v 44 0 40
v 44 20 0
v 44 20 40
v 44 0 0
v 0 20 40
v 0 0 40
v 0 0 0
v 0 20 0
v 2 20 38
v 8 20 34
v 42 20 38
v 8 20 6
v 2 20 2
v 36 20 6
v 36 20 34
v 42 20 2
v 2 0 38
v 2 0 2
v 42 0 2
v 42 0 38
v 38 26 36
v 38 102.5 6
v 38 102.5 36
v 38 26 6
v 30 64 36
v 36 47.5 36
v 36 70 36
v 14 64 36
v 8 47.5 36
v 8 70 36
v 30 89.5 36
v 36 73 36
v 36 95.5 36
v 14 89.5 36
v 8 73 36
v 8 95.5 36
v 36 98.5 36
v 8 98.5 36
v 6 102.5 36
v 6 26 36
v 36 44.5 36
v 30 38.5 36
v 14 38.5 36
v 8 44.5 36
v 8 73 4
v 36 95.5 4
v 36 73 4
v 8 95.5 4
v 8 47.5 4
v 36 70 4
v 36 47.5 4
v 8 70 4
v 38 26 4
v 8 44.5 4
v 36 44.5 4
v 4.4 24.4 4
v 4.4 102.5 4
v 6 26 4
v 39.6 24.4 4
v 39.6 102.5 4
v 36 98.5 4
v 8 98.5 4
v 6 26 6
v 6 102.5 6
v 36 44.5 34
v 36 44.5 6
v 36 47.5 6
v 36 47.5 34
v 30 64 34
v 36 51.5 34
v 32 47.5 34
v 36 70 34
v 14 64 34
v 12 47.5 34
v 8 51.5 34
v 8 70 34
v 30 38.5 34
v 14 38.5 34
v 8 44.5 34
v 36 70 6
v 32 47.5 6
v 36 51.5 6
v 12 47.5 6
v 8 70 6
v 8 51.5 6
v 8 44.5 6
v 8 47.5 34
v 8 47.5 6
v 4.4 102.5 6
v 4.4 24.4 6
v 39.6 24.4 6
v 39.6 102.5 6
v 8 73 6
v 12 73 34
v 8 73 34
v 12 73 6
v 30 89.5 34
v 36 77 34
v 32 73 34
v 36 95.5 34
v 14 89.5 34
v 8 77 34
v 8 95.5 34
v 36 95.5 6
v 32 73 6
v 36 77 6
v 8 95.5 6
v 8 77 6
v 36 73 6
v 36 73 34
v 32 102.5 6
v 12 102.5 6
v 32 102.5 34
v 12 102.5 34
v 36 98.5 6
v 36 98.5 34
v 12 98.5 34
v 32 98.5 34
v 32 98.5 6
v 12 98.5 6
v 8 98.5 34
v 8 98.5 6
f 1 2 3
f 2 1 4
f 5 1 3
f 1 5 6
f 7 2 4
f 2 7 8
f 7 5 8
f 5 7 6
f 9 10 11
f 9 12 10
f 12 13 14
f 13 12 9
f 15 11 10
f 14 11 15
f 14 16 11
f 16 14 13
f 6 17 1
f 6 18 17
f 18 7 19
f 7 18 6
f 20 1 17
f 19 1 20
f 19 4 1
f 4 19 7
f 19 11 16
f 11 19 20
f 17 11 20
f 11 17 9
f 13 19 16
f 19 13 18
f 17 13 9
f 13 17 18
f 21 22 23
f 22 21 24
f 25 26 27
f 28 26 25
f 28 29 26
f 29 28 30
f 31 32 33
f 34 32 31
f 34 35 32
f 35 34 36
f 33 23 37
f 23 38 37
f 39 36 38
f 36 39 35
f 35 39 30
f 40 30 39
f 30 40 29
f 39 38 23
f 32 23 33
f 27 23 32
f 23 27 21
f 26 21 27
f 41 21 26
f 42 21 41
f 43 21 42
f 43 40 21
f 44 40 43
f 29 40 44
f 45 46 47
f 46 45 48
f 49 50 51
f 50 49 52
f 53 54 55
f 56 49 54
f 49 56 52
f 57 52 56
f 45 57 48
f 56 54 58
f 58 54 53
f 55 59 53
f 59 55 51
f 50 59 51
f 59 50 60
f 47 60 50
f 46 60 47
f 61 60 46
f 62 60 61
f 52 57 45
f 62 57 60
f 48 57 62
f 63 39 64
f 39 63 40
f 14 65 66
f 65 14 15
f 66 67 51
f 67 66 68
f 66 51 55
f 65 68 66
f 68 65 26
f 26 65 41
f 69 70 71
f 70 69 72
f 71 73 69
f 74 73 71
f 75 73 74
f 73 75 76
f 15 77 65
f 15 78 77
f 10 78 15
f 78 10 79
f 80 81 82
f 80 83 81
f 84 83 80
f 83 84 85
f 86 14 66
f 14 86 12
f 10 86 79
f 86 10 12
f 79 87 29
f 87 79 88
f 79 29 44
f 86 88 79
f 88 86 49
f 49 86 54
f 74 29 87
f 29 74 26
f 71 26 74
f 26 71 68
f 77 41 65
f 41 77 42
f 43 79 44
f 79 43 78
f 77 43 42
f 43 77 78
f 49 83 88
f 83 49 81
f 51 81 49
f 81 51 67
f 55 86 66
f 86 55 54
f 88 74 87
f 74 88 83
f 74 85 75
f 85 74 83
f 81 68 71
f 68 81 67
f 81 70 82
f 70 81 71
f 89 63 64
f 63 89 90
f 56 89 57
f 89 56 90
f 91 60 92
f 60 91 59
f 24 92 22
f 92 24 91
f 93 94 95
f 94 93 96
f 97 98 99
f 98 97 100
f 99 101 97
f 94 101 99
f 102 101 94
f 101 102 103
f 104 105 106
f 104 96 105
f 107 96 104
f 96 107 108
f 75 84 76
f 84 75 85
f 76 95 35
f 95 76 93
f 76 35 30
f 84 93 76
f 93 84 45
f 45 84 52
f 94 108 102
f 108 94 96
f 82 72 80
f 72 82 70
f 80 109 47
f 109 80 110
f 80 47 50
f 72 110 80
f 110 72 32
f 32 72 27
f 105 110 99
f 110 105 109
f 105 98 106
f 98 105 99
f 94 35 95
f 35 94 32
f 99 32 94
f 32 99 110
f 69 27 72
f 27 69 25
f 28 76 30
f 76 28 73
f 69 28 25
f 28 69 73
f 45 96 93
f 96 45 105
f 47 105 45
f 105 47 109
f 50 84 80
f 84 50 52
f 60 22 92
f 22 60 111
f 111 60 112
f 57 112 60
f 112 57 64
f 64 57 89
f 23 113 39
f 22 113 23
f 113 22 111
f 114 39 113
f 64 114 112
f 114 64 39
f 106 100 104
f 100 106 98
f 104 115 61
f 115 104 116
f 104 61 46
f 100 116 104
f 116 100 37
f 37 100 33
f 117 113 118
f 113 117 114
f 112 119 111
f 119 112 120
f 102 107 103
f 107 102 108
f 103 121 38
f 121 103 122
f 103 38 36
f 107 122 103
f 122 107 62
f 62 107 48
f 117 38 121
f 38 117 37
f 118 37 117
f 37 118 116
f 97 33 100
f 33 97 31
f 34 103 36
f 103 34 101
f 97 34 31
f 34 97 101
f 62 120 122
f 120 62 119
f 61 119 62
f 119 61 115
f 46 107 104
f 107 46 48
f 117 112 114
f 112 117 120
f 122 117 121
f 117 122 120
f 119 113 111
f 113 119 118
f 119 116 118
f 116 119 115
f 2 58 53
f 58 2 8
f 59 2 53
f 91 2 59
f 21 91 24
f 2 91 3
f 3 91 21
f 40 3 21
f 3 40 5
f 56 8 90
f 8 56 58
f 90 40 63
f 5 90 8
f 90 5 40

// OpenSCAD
 //Variables
// Select which part you want to create: corpus is the main part of the pollenstripper, corpus_brush is a version of the pollenstripper with angled mounts for brushes, the darkener is a part that sits on top of the plexiglas cube to keep light from getting in and the funnel was meant to collect the pollen after it fell off and through the grid (deprecated)
cube_design = "corpus"; // [corpus, corpus_brush, darkener, funnel]

/* [Acrylic Cube] */
plexi_cube_width = 39; //39 for cube1, 32 for cube2
plexi_cube_length = 35; //35 for cube1, 30 for cube2
plexi_cube_depth_overall = 30;
plexi_cube_depth = 20; //this is for the main corpus
plexi_cube_thickness = 2;
plexi_cube_buffer = 0.5; //1mm room in every direction

/* [Darkener] */
// The length that the darkener overlaps with the corpus
darkener_overhang = 10;

/* [Insert] */
//needs to be the same as in the insert creator
insert_bar_height = 6;
//needs to be the same as in the insert creator
insert_bar_length = 16;
//needs to be the same as "base plate length upper" in the insert creator
insert_base_length = 28;
//needs to be the same as "base plate thickness" in the insert creator
insert_thickness = 2;
// buffer space between corpus and insert
insert_buffer = 1;
// distance of the insert from the end of the tube. CAREFUL: changing this can break the design, default=4
insert_distance_from_tube_end = 4;

/* [Corpus Basics] */
//thickness of the tubes (lower parts of the corpus containing the inserts)
tube_thickness = 2;
//width of the tubes
tube_width = 28;
//length of the tubes
tube_length = 28;
//depth of the tubes, 25.5 for normal corpus design, 32 for brush
tube_depth = 25.5; // was 38.5, for normal design 25.5, increase for brush to 32
//number of tubes
tube_count = 3;

// width of the bar that locks the inserts so that they can't move to the back, CAREFUL: changing this will break the design, default = 4
security_bar_width = 4;
slide_bar_length = tube_depth+2;
// width of the bar the funnel slides on
slide_bar_width = 1.6; //decreased from 2 to 1,6 for buffer
//height of the bar the funnel slides on
slide_bar_height = 2;

/* [Grid Pattern] */
// grid pattern, meant to let the stripped pollen fall through into the funnel
grid_pattern = "None"; //[None, squares, squares2]
//width of the squares
square_width = 5;
//length of the squares
square_length = 4;
//distance between the squares
square_distance = 2;
//number oif squares per row
number_squares_per_row = 4;
//number of squares per column, suggestion for normal corpus 2, for brush 3
number_squares_per_column = 3;

/* [Brush] */
// length of the top part of the brush
brush_head_length = 16;
// length of the bottom part of the brush
brush_bottom_length = 24;
// width of the brush
brush_width = 19.25;
// thickness of the brush
brush_thickness = 5.5;
// distance of the screw holes from the top of the brush
distance_hole_from_top = 1.6;
// distance of the screw holes from the side of the brush
distance_hole_from_side = 2.6;
// diameter of the screw holes
diameter = 3;

/* [Funnel] */
// width of the bars that slide on the corpus
funnel_slide_width = 4;
// height of the bars that slide on the corpus
funnel_slide_height = 7;
// height of the hollow part of the bars that slide on the corpus
funnel_slide_hollow_height = 3;
// buffer between the corpus bar and the funnel slide bar
funnel_slide_buffer_width = 0.2;
// length of the pyramid
funnel_pyramid_length = 32;
// height of the tip of the pyramid part
funnel_pyramid_tip_height = 18;
// width of the cube at the top of the funnel
funnel_tip_cube_width = 14;
// length of the cube at the top of the funnel
funnel_tip_cube_length = 14;
// height of the cube at the top of the funnel
funnel_tip_cube_height = 11;
// height of the cylinder that hollows out the top of the funnel
funnel_hollow_cylinder_height = 20;
// diameter of the cylinder that hollows out the top of the funnel
funnel_hollow_cylinder_diameter = 7;



/* [Misc] */
// Number of Faces: higher number is good for smoother curved areas, lower number significantly decreases rendering time, recommending 25 for playing around and 100 for exporting
$fn = 50;

//angle
tube_distance_left = (plexi_cube_width/2+plexi_cube_buffer+plexi_cube_thickness-tube_width/2-tube_thickness);
tube_distance_bottom = (plexi_cube_length/2+plexi_cube_buffer+plexi_cube_thickness-tube_length/2-tube_thickness);
angle_depth = max(tube_distance_left, tube_distance_bottom);
outer_cube_width = plexi_cube_width + 2*plexi_cube_thickness + 2*plexi_cube_buffer;
outer_cube_length = plexi_cube_length + 2*plexi_cube_thickness + 2*plexi_cube_buffer;

//module to create triangles
module triangle(width,length,height){
    difference(){
        cube([width,length,height]);
        rotate([0,0,45]) cube([width*2.5,length*2.5,height*5]);
    }
}

//module to show points of a polyhedron
module showPoints(v) {
    for (i = [0: len(v)-1]) {
        translate(v[i]) color("red") 
        text(str(i), font = "Courier New", size=1.5);
         
    }
}

//module to create a square grid pattern
module square_grid(){
    grid_width = square_width*number_squares_per_row + square_distance*(number_squares_per_row-1);
    grid_length = square_length*number_squares_per_column + square_distance*(number_squares_per_column-1);
translate([tube_width/2+tube_thickness-grid_width/2,tube_depth+angle_depth-(insert_distance_from_tube_end+insert_thickness+insert_buffer+insert_bar_height)+3,0])
translate([grid_width,0,0])
rotate([0,0,180])
for (j=[0:number_squares_per_column-1]){
for (i=[0:number_squares_per_row-1]){
    translate([i*(square_distance+square_width),j*(square_distance+square_length),0])cube([square_width,square_length,tube_thickness]);
    }
}
}

module square_grid2(){
    grid_width = square_width*number_squares_per_row + square_distance*(number_squares_per_row-1);
    grid_length = square_length*number_squares_per_column + square_distance*(number_squares_per_column-1);
translate([tube_width/2+tube_thickness-grid_width/2,tube_depth+angle_depth-(insert_distance_from_tube_end+insert_thickness+insert_buffer+insert_bar_height),0])
translate([grid_width-square_length/2,0,0])
rotate([0,0,180])
for (j=[0:number_squares_per_column-1]){
for (i=[0:number_squares_per_row-1]){
    translate([i*(square_distance+square_width),j*(square_distance+square_length),0])rotate([0,0,45])cube([square_width,square_length,tube_thickness]);
    }
}
}

//module to create a brush as a standin
module brush (){
difference(){
union(){
color("green")cube([brush_width, brush_thickness, brush_head_length]);
color("brown")translate([0,0,brush_head_length])cube([brush_width, brush_thickness, brush_bottom_length]);
}

union(){
translate([diameter/2+distance_hole_from_side,0,diameter/2 + distance_hole_from_top])rotate([270,0,0])cylinder(h=brush_thickness, d=diameter);
translate([brush_width-diameter/2-distance_hole_from_side,0,diameter/2 + distance_hole_from_top])rotate([270,0,0])cylinder(h=brush_thickness, d=diameter);
}
}
}

//module to create a mount for the brush
module brush_mount (){
difference(){
union(){
color("green")cube([brush_width, brush_thickness, brush_head_length]);
color("brown")translate([0,0,brush_head_length])cube([brush_width, brush_thickness, brush_bottom_length]);
}

union(){
translate([diameter/2+distance_hole_from_side,0,diameter/2 + distance_hole_from_top])rotate([270,0,0])cylinder(h=brush_thickness, d=diameter);
translate([brush_width-diameter/2-distance_hole_from_side,0,diameter/2 + distance_hole_from_top])rotate([270,0,0])cylinder(h=brush_thickness, d=diameter);
}
}
}


if (cube_design == "corpus"){
union(){

//plexi_cube part of the tube
difference(){
    cube([plexi_cube_width + 2*plexi_cube_thickness + 2*plexi_cube_buffer, plexi_cube_depth, plexi_cube_length+2*plexi_cube_thickness + 2*plexi_cube_buffer]);
    translate([plexi_cube_thickness,0,plexi_cube_thickness])cube([plexi_cube_width + 2*plexi_cube_buffer, plexi_cube_depth, plexi_cube_length + 2*plexi_cube_buffer]);
}

//angle
angle_points = [
    [0,0,0], //0
    [outer_cube_width,0,0],//1
    [outer_cube_width,0,outer_cube_length],//2
    [0,0,outer_cube_length],//3
    [tube_distance_left,0,tube_distance_bottom],//4
    [outer_cube_width-tube_distance_left,0,tube_distance_bottom],//5
    [outer_cube_width-tube_distance_left,0,outer_cube_length-tube_distance_bottom],//6
    [tube_distance_left,0,outer_cube_length-tube_distance_bottom],//7
    [tube_distance_left,angle_depth,tube_distance_bottom],//8
    [outer_cube_width-tube_distance_left,angle_depth,tube_distance_bottom],//9
    [outer_cube_width-tube_distance_left,angle_depth,outer_cube_length-tube_distance_bottom],//10
    [tube_distance_left,angle_depth,outer_cube_length-tube_distance_bottom],//11
    
];

*showPoints(angle_points);
angle_faces = [
    [1,0,4,5],
    [0,1,9,8],
    [5,4,8,9],
    [2,1,5,6],
    [1,2,10,9],
    [6,5,9,10],
    [3,2,6,7],
    [2,3,11,10],
    [7,6,10,11],
    [0,3,7,4],
    [3,0,8,11],
    [4,7,11,8],
];


translate([0,plexi_cube_depth,0])
polyhedron(angle_points, angle_faces);



//tube
translate([plexi_cube_width/2-tube_width/2 + plexi_cube_buffer,plexi_cube_depth ,plexi_cube_length/2-tube_length/2 + plexi_cube_buffer]) 
for(i=[0:tube_count-1]){
if (i==0){
translate([0,tube_depth*i,0])    
union(){
difference(){
    cube([tube_width+2*tube_thickness, tube_depth + angle_depth, tube_length + 2*tube_thickness]);
    translate([tube_thickness,0,tube_thickness])cube([tube_width, tube_depth + angle_depth, tube_length]);
    

insert_slot_upper_points = [
    [0,0,0], //0
    [insert_base_length,0,0],//1
    [insert_base_length,insert_thickness + insert_buffer, 0],//2
    [insert_base_length/2 + insert_bar_length/2,insert_thickness + insert_buffer + insert_bar_height,0],//3
    [insert_base_length/2 - insert_bar_length/2,insert_thickness + insert_buffer + insert_bar_height,0],//4
    [0,insert_thickness + insert_buffer, 0],//5
    [0,0,tube_thickness], //6
    [insert_base_length,0,tube_thickness],//7
    [insert_base_length,insert_thickness + insert_buffer, tube_thickness],//8
    [insert_base_length/2 + insert_bar_length/2,insert_thickness + insert_buffer + insert_bar_height,tube_thickness],//9
    [insert_base_length/2 - insert_bar_length/2,insert_thickness + insert_buffer + insert_bar_height,tube_thickness],//10
    [0,insert_thickness + insert_buffer, tube_thickness],//11
];

*showPoints(insert_slot_upper_points);

insert_slot_upper_faces = [
    [0,1,2,3,4,5],
    [0,5,11,6],
    [5,4,10,11],
    [4,3,9,10],
    [3,2,8,9],
    [2,1,7,8],
    [1,0,6,7],
    [11,10,9,8,7,6]
];

translate([tube_width/2+tube_thickness-insert_base_length/2,tube_depth+angle_depth-(insert_bar_height+insert_thickness+insert_buffer)-insert_distance_from_tube_end,tube_length+tube_thickness])translate([insert_base_length,insert_bar_height + insert_thickness + insert_buffer,0])rotate([0,0,180])polyhedron(insert_slot_upper_points,insert_slot_upper_faces);

translate([tube_width/2+tube_thickness-insert_base_length/2,tube_depth+angle_depth-(insert_thickness+insert_buffer)-insert_distance_from_tube_end,0])cube([insert_base_length,insert_thickness+insert_buffer,tube_thickness]);


if (grid_pattern == "squares") square_grid();
else if (grid_pattern == "squares2") square_grid2();   
    
}

//security_bar
translate([tube_thickness,tube_depth+angle_depth-insert_distance_from_tube_end,tube_thickness])translate([0,insert_distance_from_tube_end,0])rotate([0,0,270])triangle(insert_distance_from_tube_end,security_bar_width,tube_length);
translate([tube_width-tube_thickness,tube_depth+angle_depth-insert_distance_from_tube_end,tube_thickness])triangle(insert_distance_from_tube_end,security_bar_width,tube_length);

//slide bar
translate([-slide_bar_width,tube_depth+angle_depth-slide_bar_length,0])
color("red"){cube([slide_bar_width,slide_bar_length,slide_bar_height]); 
}
translate([tube_width+2*tube_thickness,tube_depth+angle_depth-slide_bar_length,0])
color("red"){cube([slide_bar_width,slide_bar_length,slide_bar_height]); 
}

}
}
else if (i<tube_count-1){
translate([0,tube_depth*i,0])    
union(){
difference(){
    translate([0,angle_depth,0])
    cube([tube_width+2*tube_thickness, tube_depth , tube_length + 2*tube_thickness]);
    translate([tube_thickness,0,tube_thickness])cube([tube_width, tube_depth + angle_depth, tube_length]);
    

insert_slot_upper_points = [
    [0,0,0], //0
    [insert_base_length,0,0],//1
    [insert_base_length,insert_thickness + insert_buffer, 0],//2
    [insert_base_length/2 + insert_bar_length/2,insert_thickness + insert_buffer + insert_bar_height,0],//3
    [insert_base_length/2 - insert_bar_length/2,insert_thickness + insert_buffer + insert_bar_height,0],//4
    [0,insert_thickness + insert_buffer, 0],//5
    [0,0,tube_thickness], //6
    [insert_base_length,0,tube_thickness],//7
    [insert_base_length,insert_thickness + insert_buffer, tube_thickness],//8
    [insert_base_length/2 + insert_bar_length/2,insert_thickness + insert_buffer + insert_bar_height,tube_thickness],//9
    [insert_base_length/2 - insert_bar_length/2,insert_thickness + insert_buffer + insert_bar_height,tube_thickness],//10
    [0,insert_thickness + insert_buffer, tube_thickness],//11
];

*showPoints(insert_slot_upper_points);

insert_slot_upper_faces = [
    [0,1,2,3,4,5],
    [0,5,11,6],
    [5,4,10,11],
    [4,3,9,10],
    [3,2,8,9],
    [2,1,7,8],
    [1,0,6,7],
    [11,10,9,8,7,6]
];

translate([tube_width/2+tube_thickness-insert_base_length/2,tube_depth+angle_depth-(insert_bar_height+insert_thickness+insert_buffer)-insert_distance_from_tube_end,tube_length+tube_thickness])translate([insert_base_length,insert_bar_height + insert_thickness + insert_buffer,0])rotate([0,0,180])polyhedron(insert_slot_upper_points,insert_slot_upper_faces);

translate([tube_width/2+tube_thickness-insert_base_length/2,tube_depth+angle_depth-(insert_thickness+insert_buffer)-insert_distance_from_tube_end,0])cube([insert_base_length,insert_thickness+insert_buffer,tube_thickness]);


if (grid_pattern == "squares") square_grid();
else if (grid_pattern == "squares2") square_grid2();   
    
}

//security_bar
translate([tube_thickness,tube_depth+angle_depth-insert_distance_from_tube_end,tube_thickness])translate([0,insert_distance_from_tube_end,0])rotate([0,0,270])triangle(insert_distance_from_tube_end,security_bar_width,tube_length);
translate([tube_width-tube_thickness,tube_depth+angle_depth-insert_distance_from_tube_end,tube_thickness])triangle(insert_distance_from_tube_end,security_bar_width,tube_length);

//slide bar
translate([-slide_bar_width,tube_depth+angle_depth-slide_bar_length,0])
color("red"){cube([slide_bar_width,slide_bar_length,slide_bar_height]); 
}
translate([tube_width+2*tube_thickness,tube_depth+angle_depth-slide_bar_length,0])
color("red"){cube([slide_bar_width,slide_bar_length,slide_bar_height]); 
}

}
}
else if (i==tube_count-1){
translate([0,tube_depth*i,0])    
union(){
difference(){
    translate([0,angle_depth,0])
    cube([tube_width+2*tube_thickness, tube_depth , tube_length + 2*tube_thickness]);
    translate([tube_thickness,0,tube_thickness])cube([tube_width, tube_depth + angle_depth, tube_length]);
    
//insert_slot
insert_slot_upper_points = [
    [0,0,0], //0
    [insert_base_length,0,0],//1
    [insert_base_length,insert_thickness + insert_buffer, 0],//2
    [insert_base_length/2 + insert_bar_length/2,insert_thickness + insert_buffer + insert_bar_height,0],//3
    [insert_base_length/2 - insert_bar_length/2,insert_thickness + insert_buffer + insert_bar_height,0],//4
    [0,insert_thickness + insert_buffer, 0],//5
    [0,0,tube_thickness], //6
    [insert_base_length,0,tube_thickness],//7
    [insert_base_length,insert_thickness + insert_buffer, tube_thickness],//8
    [insert_base_length/2 + insert_bar_length/2,insert_thickness + insert_buffer + insert_bar_height,tube_thickness],//9
    [insert_base_length/2 - insert_bar_length/2,insert_thickness + insert_buffer + insert_bar_height,tube_thickness],//10
    [0,insert_thickness + insert_buffer, tube_thickness],//11
];

*showPoints(insert_slot_upper_points);

insert_slot_upper_faces = [
    [0,1,2,3,4,5],
    [0,5,11,6],
    [5,4,10,11],
    [4,3,9,10],
    [3,2,8,9],
    [2,1,7,8],
    [1,0,6,7],
    [11,10,9,8,7,6]
];

translate([tube_width/2+tube_thickness-insert_base_length/2,tube_depth+angle_depth-(insert_bar_height+insert_thickness+insert_buffer)-insert_distance_from_tube_end,tube_length+tube_thickness])translate([insert_base_length,insert_bar_height + insert_thickness + insert_buffer,0])rotate([0,0,180])polyhedron(insert_slot_upper_points,insert_slot_upper_faces);

translate([tube_width/2+tube_thickness-insert_base_length/2,tube_depth+angle_depth-(insert_thickness+insert_buffer)-insert_distance_from_tube_end,0])cube([insert_base_length,insert_thickness+insert_buffer,tube_thickness]);


if (grid_pattern == "squares") square_grid();
else if (grid_pattern == "squares2") square_grid2();   
    
}
//security_bar
translate([tube_thickness,tube_depth+angle_depth-insert_distance_from_tube_end,tube_thickness])cube([security_bar_width,insert_distance_from_tube_end,tube_length]);
translate([tube_width-tube_thickness,tube_depth+angle_depth-insert_distance_from_tube_end,tube_thickness])cube([security_bar_width,insert_distance_from_tube_end,tube_length]);
//slide_bar
translate([-slide_bar_width,tube_depth+angle_depth-slide_bar_length,0])
color("red"){cube([slide_bar_width,slide_bar_length,slide_bar_height]); 
}
translate([tube_width+2*tube_thickness,tube_depth+angle_depth-slide_bar_length,0])
color("red"){cube([slide_bar_width,slide_bar_length,slide_bar_height]); 

}
}
}
}
}
}
// -----------------------------------------
if (cube_design == "corpus_brush"){
union(){

//plexi_cube part of the tube
difference(){
    cube([plexi_cube_width + 2*plexi_cube_thickness + 2*plexi_cube_buffer, plexi_cube_depth, plexi_cube_length+2*plexi_cube_thickness + 2*plexi_cube_buffer]);
    translate([plexi_cube_thickness,0,plexi_cube_thickness])cube([plexi_cube_width + 2*plexi_cube_buffer, plexi_cube_depth, plexi_cube_length + 2*plexi_cube_buffer]);
}

//angle
angle_points = [
    [0,0,0], //0
    [outer_cube_width,0,0],//1
    [outer_cube_width,0,outer_cube_length],//2
    [0,0,outer_cube_length],//3
    [tube_distance_left,0,tube_distance_bottom],//4
    [outer_cube_width-tube_distance_left,0,tube_distance_bottom],//5
    [outer_cube_width-tube_distance_left,0,outer_cube_length-tube_distance_bottom],//6
    [tube_distance_left,0,outer_cube_length-tube_distance_bottom],//7
    [tube_distance_left,angle_depth,tube_distance_bottom],//8
    [outer_cube_width-tube_distance_left,angle_depth,tube_distance_bottom],//9
    [outer_cube_width-tube_distance_left,angle_depth,outer_cube_length-tube_distance_bottom],//10
    [tube_distance_left,angle_depth,outer_cube_length-tube_distance_bottom],//11
    
];

*showPoints(angle_points);
angle_faces = [
    [1,0,4,5],
    [0,1,9,8],
    [5,4,8,9],
    [2,1,5,6],
    [1,2,10,9],
    [6,5,9,10],
    [3,2,6,7],
    [2,3,11,10],
    [7,6,10,11],
    [0,3,7,4],
    [3,0,8,11],
    [4,7,11,8],
];


translate([0,plexi_cube_depth,0])
polyhedron(angle_points, angle_faces);



//tube
translate([plexi_cube_width/2-tube_width/2 + plexi_cube_buffer,plexi_cube_depth ,plexi_cube_length/2-tube_length/2 + plexi_cube_buffer]) 

union(){
difference(){
    union(){
    cube([tube_width+2*tube_thickness, tube_depth + angle_depth, tube_length + 2*tube_thickness]);
        
    //Brush mounts
translate([-(plexi_cube_width/2-tube_width/2 + plexi_cube_buffer),-(plexi_cube_depth) ,-(plexi_cube_length/2-tube_length/2 + plexi_cube_buffer)]) translate([0,plexi_cube_width+tube_depth/2,((plexi_cube_length+2*plexi_cube_thickness+2*plexi_cube_buffer)-brush_width)/2])translate([-brush_head_length,0,brush_width])rotate([30,90,0])translate([0,brush_thickness,0])brush_mount();

translate([-(plexi_cube_width/2-tube_width/2 + plexi_cube_buffer),-(plexi_cube_depth) ,-(plexi_cube_length/2-tube_length/2 + plexi_cube_buffer)])translate([0,plexi_cube_width+tube_depth/2,((plexi_cube_length+2*plexi_cube_thickness+2*plexi_cube_buffer)-brush_width)/2])translate([+brush_head_length,0,brush_width])translate([plexi_cube_width+2*plexi_cube_thickness + 2*plexi_cube_buffer,0,-brush_width])rotate([0,180,0])rotate([30,90,0])translate([0,brush_thickness,0])brush_mount();
    }
    insert_slot_upper_points = [
    [0,0,0], //0
    [insert_base_length,0,0],//1
    [insert_base_length,insert_thickness + insert_buffer, 0],//2
    [insert_base_length/2 + insert_bar_length/2,insert_thickness + insert_buffer + insert_bar_height,0],//3
    [insert_base_length/2 - insert_bar_length/2,insert_thickness + insert_buffer + insert_bar_height,0],//4
    [0,insert_thickness + insert_buffer, 0],//5
    [0,0,tube_thickness], //6
    [insert_base_length,0,tube_thickness],//7
    [insert_base_length,insert_thickness + insert_buffer, tube_thickness],//8
    [insert_base_length/2 + insert_bar_length/2,insert_thickness + insert_buffer + insert_bar_height,tube_thickness],//9
    [insert_base_length/2 - insert_bar_length/2,insert_thickness + insert_buffer + insert_bar_height,tube_thickness],//10
    [0,insert_thickness + insert_buffer, tube_thickness],//11
];

*showPoints(insert_slot_upper_points);

insert_slot_upper_faces = [
    [0,1,2,3,4,5],
    [0,5,11,6],
    [5,4,10,11],
    [4,3,9,10],
    [3,2,8,9],
    [2,1,7,8],
    [1,0,6,7],
    [11,10,9,8,7,6]
];

translate([tube_width/2+tube_thickness-insert_base_length/2,tube_depth+angle_depth-(insert_bar_height+insert_thickness+insert_buffer)-insert_distance_from_tube_end,tube_length+tube_thickness])translate([insert_base_length,insert_bar_height + insert_thickness + insert_buffer,0])rotate([0,0,180])polyhedron(insert_slot_upper_points,insert_slot_upper_faces);

translate([tube_width/2+tube_thickness-insert_base_length/2,tube_depth+angle_depth-(insert_thickness+insert_buffer)-insert_distance_from_tube_end,0])cube([insert_base_length,insert_thickness+insert_buffer,tube_thickness]);

    translate([tube_thickness,0,tube_thickness])cube([tube_width, tube_depth + angle_depth, tube_length]);
    
    //Brushes for to get the spacing right
translate([-(plexi_cube_width/2-tube_width/2 + plexi_cube_buffer),-(plexi_cube_depth) ,-(plexi_cube_length/2-tube_length/2 + plexi_cube_buffer)])translate([0,plexi_cube_width+tube_depth/2,((plexi_cube_length+2*plexi_cube_thickness+2*plexi_cube_buffer)-brush_width)/2])translate([-brush_head_length,0,brush_width])rotate([30,90,0])brush();

translate([-(plexi_cube_width/2-tube_width/2 + plexi_cube_buffer),-(plexi_cube_depth) ,-(plexi_cube_length/2-tube_length/2 + plexi_cube_buffer)])translate([0,plexi_cube_width+tube_depth/2,((plexi_cube_length+2*plexi_cube_thickness+2*plexi_cube_buffer)-brush_width)/2])translate([+brush_head_length,0,brush_width])translate([plexi_cube_width+2*plexi_cube_thickness + 2*plexi_cube_buffer,0,-brush_width])rotate([0,180,0])rotate([30,90,0])brush();

    
if (grid_pattern == "squares") square_grid();
else if (grid_pattern == "squares2") square_grid2();   
}

//security_bar
translate([tube_thickness,tube_depth+angle_depth-insert_distance_from_tube_end,tube_thickness])translate([0,insert_distance_from_tube_end,0])rotate([0,0,270])triangle(insert_distance_from_tube_end,security_bar_width,tube_length);
translate([tube_width-tube_thickness,tube_depth+angle_depth-insert_distance_from_tube_end,tube_thickness])triangle(insert_distance_from_tube_end,security_bar_width,tube_length);


//slide bar
translate([-slide_bar_width,tube_depth+angle_depth-slide_bar_length,0])
color("red"){cube([slide_bar_width,slide_bar_length,slide_bar_height]); 
}
translate([tube_width+2*tube_thickness,tube_depth+angle_depth-slide_bar_length,0])
color("red"){cube([slide_bar_width,slide_bar_length,slide_bar_height]); 
}
}
}
}




// darkener
else if (cube_design == "darkener"){
darkener_top_width = plexi_cube_width+2*plexi_cube_thickness+2*plexi_cube_buffer;
darkener_top_depth = plexi_cube_depth_overall-plexi_cube_depth+plexi_cube_thickness;
darkener_top_length = plexi_cube_length+2*plexi_cube_thickness+2*plexi_cube_buffer;
darkener_bottom_width = plexi_cube_width+4*plexi_cube_thickness+4*plexi_cube_buffer;
darkener_bottom_depth = darkener_overhang+2*plexi_cube_thickness;
darkener_bottom_length = plexi_cube_length+4*plexi_cube_thickness+4*plexi_cube_buffer;

difference(){
cube([darkener_bottom_width,darkener_top_depth,darkener_bottom_length]);
translate([2*plexi_cube_thickness+2*plexi_cube_buffer,plexi_cube_thickness,2*plexi_cube_thickness+2*plexi_cube_buffer])cube([darkener_top_width-2*plexi_cube_thickness,darkener_top_depth-plexi_cube_thickness,darkener_top_length - 2*plexi_cube_thickness]);
}
    

translate([0,darkener_top_depth,0])difference(){
cube([darkener_bottom_width,darkener_bottom_depth,darkener_bottom_length]);
translate([plexi_cube_thickness+plexi_cube_buffer,0,plexi_cube_thickness+plexi_cube_buffer]) cube([plexi_cube_width+2*plexi_cube_thickness+3*plexi_cube_buffer,darkener_overhang+2*plexi_cube_thickness,plexi_cube_length+2*plexi_cube_thickness+3*plexi_cube_buffer]);

}
}

else if (cube_design == "funnel"){
    funnel_slide_length = tube_count * tube_depth - 8;
    translate([0,funnel_pyramid_length+funnel_slide_width,0])
    difference(){
    cube([funnel_slide_length, funnel_slide_width, funnel_slide_height]);
    translate([0,0,2])cube([funnel_slide_length,funnel_slide_width/2, funnel_slide_hollow_height]);
    cube([funnel_slide_length, funnel_slide_buffer_width,2]);
    }
    translate([0,funnel_slide_width,0])mirror([0,1,0])difference(){
    cube([funnel_slide_length, funnel_slide_width, funnel_slide_height]);
    translate([0,0,2])cube([funnel_slide_length,funnel_slide_width/2, funnel_slide_hollow_height]);
    cube([funnel_slide_length, funnel_slide_buffer_width,2]);
    }
    
    
    funnel_pyramid_points = [
    [funnel_slide_length, funnel_pyramid_length,0],
    [funnel_slide_length,0,0],
    [0,0,0],
    [0,funnel_pyramid_length,0],
    [funnel_slide_length/2,funnel_pyramid_length/2,funnel_pyramid_tip_height]];
    
    funnel_pyramid_faces = [
    [0,1,4],
    [1,2,4],
    [2,3,4],
    [3,0,4],
    [1,0,3],
    [2,1,3]];
    
    funnel_pyramid_points_hollow = [
    [funnel_slide_length, funnel_pyramid_length,-2],
    [funnel_slide_length,0,-2],
    [0,0,-2],
    [0,funnel_pyramid_length,-2],
    [funnel_slide_length/2,funnel_pyramid_length/2,funnel_pyramid_tip_height-1]];
    
    funnel_pyramid_faces_hollow = [
    [0,1,4],
    [1,2,4],
    [2,3,4],
    [3,0,4],
    [1,0,3],
    [2,1,3]];
    
    difference(){
    union(){translate([0,funnel_slide_width,funnel_slide_height-2])cube([funnel_slide_length,funnel_pyramid_length, 2]);
    translate([0,funnel_slide_width,funnel_slide_height])polyhedron(funnel_pyramid_points, funnel_pyramid_faces);
    translate([funnel_slide_length/2-funnel_tip_cube_length/2,(funnel_pyramid_length+2*funnel_slide_width)/2-funnel_tip_cube_width/2,funnel_pyramid_tip_height+funnel_slide_height-funnel_tip_cube_height-1])cube([funnel_tip_cube_width, funnel_tip_cube_length, funnel_tip_cube_height]);
    }
    union(){
    color("red")translate([0,funnel_slide_width,funnel_slide_height])polyhedron(funnel_pyramid_points_hollow, funnel_pyramid_faces_hollow);
    
    translate([funnel_slide_length/2,funnel_pyramid_length/2 + funnel_slide_width,10])color("turquoise")cylinder(h=funnel_hollow_cylinder_height, d=funnel_hollow_cylinder_diameter);
    }
}
}
